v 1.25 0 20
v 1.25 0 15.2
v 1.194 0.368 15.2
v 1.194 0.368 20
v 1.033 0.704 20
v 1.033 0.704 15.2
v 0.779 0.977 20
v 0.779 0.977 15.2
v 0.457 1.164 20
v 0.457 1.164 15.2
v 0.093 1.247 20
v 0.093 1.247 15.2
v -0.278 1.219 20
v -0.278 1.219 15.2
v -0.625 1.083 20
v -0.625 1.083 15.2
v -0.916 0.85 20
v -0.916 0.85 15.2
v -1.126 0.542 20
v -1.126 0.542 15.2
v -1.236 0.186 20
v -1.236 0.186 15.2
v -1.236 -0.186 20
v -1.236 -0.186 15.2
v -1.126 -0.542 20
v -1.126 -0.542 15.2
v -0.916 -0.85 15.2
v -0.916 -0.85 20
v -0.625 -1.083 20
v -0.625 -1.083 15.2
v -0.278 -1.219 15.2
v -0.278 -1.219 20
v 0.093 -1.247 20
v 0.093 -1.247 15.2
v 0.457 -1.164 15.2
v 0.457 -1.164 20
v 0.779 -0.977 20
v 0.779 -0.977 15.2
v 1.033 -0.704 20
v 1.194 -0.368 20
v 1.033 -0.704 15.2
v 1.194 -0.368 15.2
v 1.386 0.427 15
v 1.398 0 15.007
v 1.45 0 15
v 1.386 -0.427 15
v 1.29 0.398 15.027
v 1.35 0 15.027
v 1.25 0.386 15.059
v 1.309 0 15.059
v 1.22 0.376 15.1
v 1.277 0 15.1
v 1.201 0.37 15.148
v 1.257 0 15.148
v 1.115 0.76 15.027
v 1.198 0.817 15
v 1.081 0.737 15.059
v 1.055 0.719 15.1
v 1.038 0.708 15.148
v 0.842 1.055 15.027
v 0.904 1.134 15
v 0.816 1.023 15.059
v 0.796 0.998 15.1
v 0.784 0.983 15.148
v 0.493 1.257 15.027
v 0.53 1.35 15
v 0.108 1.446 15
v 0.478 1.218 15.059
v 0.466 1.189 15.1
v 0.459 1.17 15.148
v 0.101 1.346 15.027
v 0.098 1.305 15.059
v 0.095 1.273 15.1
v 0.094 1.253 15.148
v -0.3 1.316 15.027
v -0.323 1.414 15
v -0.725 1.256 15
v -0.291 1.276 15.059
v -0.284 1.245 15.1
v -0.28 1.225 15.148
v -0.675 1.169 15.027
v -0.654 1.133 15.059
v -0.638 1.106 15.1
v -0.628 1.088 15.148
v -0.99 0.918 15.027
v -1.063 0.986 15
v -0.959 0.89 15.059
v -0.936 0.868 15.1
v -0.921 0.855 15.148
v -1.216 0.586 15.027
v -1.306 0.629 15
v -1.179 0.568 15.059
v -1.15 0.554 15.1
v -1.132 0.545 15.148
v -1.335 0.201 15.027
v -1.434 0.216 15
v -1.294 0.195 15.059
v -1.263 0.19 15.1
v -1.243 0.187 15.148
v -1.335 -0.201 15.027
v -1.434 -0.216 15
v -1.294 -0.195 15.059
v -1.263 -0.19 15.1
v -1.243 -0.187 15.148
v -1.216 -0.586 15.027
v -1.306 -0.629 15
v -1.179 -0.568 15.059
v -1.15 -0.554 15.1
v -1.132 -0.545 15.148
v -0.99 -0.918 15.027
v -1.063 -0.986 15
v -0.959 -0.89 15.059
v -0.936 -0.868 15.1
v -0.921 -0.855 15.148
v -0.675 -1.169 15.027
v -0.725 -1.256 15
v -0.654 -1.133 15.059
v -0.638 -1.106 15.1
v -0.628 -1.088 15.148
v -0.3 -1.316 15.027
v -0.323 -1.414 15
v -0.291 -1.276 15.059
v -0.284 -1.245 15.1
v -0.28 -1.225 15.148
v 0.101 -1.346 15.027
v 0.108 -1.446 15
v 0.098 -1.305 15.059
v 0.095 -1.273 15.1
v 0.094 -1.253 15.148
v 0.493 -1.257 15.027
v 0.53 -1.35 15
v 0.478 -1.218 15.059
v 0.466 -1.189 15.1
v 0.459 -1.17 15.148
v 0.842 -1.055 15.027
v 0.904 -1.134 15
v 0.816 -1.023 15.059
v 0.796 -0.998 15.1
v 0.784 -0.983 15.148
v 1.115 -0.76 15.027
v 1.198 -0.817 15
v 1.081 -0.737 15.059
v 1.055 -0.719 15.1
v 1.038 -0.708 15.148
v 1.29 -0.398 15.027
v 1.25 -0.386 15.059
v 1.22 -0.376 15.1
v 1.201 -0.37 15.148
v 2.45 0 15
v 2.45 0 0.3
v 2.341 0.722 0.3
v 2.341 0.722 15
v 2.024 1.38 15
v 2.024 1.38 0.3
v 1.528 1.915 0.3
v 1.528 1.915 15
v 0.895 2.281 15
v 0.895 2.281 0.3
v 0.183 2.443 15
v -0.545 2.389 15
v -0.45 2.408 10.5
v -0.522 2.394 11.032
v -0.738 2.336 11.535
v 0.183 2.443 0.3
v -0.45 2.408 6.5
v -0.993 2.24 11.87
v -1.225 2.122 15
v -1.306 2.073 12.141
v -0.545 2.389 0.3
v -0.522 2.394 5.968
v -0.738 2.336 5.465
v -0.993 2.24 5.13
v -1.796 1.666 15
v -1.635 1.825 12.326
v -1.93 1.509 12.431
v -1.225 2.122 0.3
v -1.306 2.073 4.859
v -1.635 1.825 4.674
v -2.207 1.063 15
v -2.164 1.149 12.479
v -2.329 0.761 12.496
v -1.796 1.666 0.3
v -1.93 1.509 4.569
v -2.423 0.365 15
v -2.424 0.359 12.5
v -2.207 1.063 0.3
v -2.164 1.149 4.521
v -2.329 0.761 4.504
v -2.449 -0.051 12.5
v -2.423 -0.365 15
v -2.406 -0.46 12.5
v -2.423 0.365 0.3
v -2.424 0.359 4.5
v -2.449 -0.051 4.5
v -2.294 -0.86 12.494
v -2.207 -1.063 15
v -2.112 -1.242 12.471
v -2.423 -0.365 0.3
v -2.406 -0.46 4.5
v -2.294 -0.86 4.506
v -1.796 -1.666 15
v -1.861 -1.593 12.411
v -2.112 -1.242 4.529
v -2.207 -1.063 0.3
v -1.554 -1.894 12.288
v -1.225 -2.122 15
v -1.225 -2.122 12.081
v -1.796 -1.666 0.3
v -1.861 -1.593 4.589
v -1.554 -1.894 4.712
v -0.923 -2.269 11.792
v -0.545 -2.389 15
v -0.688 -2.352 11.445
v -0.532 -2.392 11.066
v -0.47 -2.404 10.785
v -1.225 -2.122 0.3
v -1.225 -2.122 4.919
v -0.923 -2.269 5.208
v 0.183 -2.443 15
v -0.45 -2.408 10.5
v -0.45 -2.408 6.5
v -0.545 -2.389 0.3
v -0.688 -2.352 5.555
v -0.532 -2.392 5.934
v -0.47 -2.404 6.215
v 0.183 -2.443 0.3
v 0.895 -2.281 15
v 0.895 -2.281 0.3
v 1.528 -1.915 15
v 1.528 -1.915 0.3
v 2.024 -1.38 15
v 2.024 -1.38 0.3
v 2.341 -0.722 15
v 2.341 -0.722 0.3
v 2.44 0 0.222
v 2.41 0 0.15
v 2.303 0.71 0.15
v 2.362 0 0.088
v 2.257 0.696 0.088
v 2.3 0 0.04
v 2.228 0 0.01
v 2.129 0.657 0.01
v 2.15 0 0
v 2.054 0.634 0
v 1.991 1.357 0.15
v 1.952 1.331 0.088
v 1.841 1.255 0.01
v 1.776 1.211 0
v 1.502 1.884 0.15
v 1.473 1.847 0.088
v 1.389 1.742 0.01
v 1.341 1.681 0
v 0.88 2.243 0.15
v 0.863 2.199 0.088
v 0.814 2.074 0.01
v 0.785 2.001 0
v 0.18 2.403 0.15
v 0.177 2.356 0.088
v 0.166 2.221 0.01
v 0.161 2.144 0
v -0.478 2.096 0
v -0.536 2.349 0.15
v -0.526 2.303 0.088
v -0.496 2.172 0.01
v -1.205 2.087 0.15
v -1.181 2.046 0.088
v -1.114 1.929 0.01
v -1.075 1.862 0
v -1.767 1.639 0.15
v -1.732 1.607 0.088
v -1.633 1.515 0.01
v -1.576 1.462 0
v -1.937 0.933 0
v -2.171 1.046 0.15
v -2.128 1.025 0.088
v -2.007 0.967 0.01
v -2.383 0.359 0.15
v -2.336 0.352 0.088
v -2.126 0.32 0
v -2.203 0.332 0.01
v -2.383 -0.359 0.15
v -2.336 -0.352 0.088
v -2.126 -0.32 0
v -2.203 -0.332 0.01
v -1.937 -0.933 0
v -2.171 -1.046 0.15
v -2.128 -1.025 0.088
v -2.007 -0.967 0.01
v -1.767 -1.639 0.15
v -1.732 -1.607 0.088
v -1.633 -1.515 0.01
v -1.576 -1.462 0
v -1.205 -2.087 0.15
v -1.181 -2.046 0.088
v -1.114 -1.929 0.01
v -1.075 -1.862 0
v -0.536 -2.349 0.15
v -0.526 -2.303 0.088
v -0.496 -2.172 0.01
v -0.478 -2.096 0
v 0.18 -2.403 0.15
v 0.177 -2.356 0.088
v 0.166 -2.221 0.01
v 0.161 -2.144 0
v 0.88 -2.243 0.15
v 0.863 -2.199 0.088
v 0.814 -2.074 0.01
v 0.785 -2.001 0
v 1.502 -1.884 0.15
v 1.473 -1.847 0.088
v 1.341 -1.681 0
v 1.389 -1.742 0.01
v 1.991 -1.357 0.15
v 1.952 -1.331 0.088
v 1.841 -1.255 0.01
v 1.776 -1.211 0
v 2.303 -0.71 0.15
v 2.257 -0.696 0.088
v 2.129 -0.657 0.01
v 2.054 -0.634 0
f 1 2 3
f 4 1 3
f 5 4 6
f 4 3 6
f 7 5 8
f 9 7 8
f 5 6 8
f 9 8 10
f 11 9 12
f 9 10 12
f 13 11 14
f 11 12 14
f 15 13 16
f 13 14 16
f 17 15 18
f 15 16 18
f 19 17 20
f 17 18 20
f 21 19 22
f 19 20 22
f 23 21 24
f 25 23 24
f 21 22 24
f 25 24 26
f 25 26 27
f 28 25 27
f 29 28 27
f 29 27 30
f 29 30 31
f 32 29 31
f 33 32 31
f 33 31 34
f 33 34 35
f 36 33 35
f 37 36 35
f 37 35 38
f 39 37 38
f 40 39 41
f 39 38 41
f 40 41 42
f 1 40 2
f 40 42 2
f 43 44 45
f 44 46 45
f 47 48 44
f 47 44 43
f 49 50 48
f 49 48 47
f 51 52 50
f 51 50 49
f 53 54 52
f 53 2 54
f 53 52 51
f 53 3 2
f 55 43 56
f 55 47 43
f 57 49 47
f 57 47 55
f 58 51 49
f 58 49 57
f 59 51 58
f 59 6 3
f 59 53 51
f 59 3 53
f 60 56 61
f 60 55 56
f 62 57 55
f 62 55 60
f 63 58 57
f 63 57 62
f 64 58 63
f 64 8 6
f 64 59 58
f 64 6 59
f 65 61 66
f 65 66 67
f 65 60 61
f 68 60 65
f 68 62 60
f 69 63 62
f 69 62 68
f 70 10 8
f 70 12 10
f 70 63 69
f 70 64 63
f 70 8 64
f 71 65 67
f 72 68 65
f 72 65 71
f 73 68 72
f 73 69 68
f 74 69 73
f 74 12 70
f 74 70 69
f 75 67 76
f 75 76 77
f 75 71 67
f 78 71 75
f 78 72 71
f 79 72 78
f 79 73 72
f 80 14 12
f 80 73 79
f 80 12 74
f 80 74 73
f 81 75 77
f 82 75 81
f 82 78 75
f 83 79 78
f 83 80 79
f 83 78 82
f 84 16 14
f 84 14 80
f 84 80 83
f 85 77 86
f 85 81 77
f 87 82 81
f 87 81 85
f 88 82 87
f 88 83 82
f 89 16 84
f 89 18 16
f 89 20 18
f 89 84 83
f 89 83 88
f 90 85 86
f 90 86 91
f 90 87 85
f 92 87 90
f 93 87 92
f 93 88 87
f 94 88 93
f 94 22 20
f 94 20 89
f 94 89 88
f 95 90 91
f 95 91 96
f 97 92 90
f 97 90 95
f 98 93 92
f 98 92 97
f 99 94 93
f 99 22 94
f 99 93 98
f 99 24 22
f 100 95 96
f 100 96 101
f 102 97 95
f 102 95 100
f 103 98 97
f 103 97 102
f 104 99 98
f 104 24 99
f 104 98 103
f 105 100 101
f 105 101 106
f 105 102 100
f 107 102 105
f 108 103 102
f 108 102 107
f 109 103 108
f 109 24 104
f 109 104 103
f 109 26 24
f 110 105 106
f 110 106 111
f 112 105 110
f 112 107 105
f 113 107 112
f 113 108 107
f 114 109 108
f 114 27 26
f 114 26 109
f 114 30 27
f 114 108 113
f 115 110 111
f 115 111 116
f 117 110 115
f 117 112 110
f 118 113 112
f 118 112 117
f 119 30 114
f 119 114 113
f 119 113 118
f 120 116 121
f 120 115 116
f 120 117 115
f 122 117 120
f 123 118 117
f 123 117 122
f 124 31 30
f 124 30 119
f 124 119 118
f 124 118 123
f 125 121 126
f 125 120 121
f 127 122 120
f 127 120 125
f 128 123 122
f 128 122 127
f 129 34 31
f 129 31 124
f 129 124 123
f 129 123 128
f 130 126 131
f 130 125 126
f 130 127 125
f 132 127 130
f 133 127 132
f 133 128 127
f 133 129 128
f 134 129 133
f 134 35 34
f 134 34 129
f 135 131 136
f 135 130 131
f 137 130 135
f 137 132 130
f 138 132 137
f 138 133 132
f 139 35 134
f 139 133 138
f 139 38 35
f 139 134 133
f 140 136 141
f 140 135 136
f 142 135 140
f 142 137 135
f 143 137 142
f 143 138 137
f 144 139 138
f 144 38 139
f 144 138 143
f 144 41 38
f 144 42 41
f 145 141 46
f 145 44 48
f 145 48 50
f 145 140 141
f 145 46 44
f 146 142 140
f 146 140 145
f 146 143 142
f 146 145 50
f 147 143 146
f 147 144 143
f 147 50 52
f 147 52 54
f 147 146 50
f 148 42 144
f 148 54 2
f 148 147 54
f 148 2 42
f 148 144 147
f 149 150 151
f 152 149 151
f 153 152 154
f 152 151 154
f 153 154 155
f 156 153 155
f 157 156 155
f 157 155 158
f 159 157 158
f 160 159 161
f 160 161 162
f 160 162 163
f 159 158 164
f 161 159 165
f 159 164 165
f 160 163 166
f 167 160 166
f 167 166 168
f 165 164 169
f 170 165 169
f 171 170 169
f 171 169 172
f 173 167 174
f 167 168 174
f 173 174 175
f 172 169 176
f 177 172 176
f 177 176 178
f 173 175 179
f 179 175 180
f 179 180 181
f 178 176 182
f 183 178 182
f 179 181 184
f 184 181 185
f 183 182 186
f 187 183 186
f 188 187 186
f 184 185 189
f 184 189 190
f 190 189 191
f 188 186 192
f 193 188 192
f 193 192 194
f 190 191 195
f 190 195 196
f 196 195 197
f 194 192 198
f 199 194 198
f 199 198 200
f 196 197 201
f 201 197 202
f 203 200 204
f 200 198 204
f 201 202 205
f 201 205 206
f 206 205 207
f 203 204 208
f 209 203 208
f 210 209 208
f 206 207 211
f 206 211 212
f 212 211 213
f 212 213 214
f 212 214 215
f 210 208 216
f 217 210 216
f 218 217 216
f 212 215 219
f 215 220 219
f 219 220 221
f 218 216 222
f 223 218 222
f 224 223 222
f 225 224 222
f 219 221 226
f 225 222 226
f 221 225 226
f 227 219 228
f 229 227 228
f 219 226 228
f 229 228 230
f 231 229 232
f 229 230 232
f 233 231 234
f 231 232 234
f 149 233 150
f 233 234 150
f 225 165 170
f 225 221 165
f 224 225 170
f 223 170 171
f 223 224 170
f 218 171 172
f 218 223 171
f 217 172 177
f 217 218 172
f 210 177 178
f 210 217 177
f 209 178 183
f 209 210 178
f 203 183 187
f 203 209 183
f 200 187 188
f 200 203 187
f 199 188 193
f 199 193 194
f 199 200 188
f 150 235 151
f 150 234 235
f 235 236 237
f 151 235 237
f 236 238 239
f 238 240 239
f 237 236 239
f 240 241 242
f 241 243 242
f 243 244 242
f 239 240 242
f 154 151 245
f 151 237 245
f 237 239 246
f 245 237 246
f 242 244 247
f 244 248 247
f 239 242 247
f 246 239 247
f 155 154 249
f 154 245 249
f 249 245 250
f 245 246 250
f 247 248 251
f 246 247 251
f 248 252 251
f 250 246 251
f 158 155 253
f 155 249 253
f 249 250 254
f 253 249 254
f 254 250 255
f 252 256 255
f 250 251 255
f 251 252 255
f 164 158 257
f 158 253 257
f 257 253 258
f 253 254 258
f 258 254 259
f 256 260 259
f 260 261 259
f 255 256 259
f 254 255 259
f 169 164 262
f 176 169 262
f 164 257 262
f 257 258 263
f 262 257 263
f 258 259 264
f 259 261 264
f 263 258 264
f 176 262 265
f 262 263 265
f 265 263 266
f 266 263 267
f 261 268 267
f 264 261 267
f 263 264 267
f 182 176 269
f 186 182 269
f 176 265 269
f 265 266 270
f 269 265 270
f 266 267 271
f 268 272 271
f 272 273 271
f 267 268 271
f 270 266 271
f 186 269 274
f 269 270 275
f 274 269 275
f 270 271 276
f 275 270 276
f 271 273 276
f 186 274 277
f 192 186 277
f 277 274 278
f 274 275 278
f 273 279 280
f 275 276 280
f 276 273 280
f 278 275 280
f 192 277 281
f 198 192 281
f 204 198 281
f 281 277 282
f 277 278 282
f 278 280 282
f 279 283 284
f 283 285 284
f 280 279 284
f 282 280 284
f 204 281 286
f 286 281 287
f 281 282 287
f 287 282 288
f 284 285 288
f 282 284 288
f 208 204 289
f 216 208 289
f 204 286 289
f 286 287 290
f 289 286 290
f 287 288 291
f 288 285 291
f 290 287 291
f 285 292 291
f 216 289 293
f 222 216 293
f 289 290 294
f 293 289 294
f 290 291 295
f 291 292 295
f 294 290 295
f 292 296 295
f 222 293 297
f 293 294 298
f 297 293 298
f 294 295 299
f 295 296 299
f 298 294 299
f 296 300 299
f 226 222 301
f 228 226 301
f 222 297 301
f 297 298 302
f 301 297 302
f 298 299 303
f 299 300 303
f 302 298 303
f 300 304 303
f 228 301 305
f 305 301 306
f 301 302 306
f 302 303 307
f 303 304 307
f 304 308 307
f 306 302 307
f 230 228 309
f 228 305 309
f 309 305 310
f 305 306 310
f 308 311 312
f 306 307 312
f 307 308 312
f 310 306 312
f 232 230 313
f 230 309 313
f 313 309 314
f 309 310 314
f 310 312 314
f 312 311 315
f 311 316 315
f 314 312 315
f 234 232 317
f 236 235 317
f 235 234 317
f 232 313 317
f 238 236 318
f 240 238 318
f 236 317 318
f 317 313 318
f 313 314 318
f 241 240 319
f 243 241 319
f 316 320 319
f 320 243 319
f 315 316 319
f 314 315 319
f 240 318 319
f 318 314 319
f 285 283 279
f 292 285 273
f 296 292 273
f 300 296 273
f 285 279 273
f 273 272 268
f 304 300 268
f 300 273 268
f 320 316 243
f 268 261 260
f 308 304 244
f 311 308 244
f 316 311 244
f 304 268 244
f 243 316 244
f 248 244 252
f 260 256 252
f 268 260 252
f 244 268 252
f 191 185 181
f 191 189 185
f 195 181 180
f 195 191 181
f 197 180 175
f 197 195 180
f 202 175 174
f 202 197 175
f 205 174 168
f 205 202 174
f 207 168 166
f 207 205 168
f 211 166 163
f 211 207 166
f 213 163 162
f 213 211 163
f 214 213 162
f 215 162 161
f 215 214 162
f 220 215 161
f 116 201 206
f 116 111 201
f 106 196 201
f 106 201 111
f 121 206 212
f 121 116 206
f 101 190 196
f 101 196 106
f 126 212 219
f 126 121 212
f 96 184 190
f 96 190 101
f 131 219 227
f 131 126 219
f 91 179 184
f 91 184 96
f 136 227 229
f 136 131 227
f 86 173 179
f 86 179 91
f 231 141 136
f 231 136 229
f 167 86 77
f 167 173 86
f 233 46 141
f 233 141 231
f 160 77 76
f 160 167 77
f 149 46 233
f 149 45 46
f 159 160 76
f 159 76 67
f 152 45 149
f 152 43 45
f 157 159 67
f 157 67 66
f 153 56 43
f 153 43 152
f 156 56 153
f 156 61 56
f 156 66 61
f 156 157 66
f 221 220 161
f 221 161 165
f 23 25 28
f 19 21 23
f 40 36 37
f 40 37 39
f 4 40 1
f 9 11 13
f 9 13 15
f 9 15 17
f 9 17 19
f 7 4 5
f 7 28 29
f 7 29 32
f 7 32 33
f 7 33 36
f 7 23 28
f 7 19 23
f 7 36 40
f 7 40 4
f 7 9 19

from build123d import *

# Parameters (mm, degrees)
SKETCH_1_R               = 2.45
EXTRUDE_1_DEPTH          = 15
CUT_EXTRUDE_1_DEPTH      = 16.39496671
CUT_EXTRUDE_1_DEPTH_BACK = 16.39496671
SKETCH_3_R               = 1.25
EXTRUDE_2_DEPTH          = 5
FILLET_1_R               = 0.3
FILLET_2_R               = 0.2


with BuildPart() as part:
    # 스케치1 → 보스-돌출1 (new body)
    with BuildSketch(Plane.XY):
        Circle(SKETCH_1_R)
    extrude(amount=EXTRUDE_1_DEPTH)

    # 스케치2 → 컷-돌출1 (cut, two sides: drawn at the far end of the back side and taken through both)
    with BuildSketch(Plane(origin=(0, 0, 0), x_dir=(1, 0, 0), z_dir=(0, 1, 0)).offset(-CUT_EXTRUDE_1_DEPTH_BACK)):
        with BuildLine():
            Line((-4.45, -6.5), (-4.45, -10.5))
            ThreePointArc((-4.45, -10.5), (-2.45, -12.5), (-0.45, -10.5))
            Line((-0.45, -10.5), (-0.45, -6.5))
            ThreePointArc((-0.45, -6.5), (-2.45, -4.5), (-4.45, -6.5))
        make_face()
    extrude(amount=CUT_EXTRUDE_1_DEPTH + CUT_EXTRUDE_1_DEPTH_BACK, mode=Mode.SUBTRACT)

    # 스케치3 → 보스-돌출2 (add)
    with BuildSketch(Plane.XY.offset(15)):
        Circle(SKETCH_3_R)
    extrude(amount=EXTRUDE_2_DEPTH)

    # 필렛1
    fillet_1_edges = [part.edges().sort_by_distance(p)[0] for p in [
        (-2.45, 0, 0),
    ]]
    fillet(fillet_1_edges, radius=FILLET_1_R)

    # 필렛2
    fillet_2_edges = [part.edges().sort_by_distance(p)[0] for p in [
        (-1.25, 0, 15),
    ]]
    fillet(fillet_2_edges, radius=FILLET_2_R)


solid = part.part
